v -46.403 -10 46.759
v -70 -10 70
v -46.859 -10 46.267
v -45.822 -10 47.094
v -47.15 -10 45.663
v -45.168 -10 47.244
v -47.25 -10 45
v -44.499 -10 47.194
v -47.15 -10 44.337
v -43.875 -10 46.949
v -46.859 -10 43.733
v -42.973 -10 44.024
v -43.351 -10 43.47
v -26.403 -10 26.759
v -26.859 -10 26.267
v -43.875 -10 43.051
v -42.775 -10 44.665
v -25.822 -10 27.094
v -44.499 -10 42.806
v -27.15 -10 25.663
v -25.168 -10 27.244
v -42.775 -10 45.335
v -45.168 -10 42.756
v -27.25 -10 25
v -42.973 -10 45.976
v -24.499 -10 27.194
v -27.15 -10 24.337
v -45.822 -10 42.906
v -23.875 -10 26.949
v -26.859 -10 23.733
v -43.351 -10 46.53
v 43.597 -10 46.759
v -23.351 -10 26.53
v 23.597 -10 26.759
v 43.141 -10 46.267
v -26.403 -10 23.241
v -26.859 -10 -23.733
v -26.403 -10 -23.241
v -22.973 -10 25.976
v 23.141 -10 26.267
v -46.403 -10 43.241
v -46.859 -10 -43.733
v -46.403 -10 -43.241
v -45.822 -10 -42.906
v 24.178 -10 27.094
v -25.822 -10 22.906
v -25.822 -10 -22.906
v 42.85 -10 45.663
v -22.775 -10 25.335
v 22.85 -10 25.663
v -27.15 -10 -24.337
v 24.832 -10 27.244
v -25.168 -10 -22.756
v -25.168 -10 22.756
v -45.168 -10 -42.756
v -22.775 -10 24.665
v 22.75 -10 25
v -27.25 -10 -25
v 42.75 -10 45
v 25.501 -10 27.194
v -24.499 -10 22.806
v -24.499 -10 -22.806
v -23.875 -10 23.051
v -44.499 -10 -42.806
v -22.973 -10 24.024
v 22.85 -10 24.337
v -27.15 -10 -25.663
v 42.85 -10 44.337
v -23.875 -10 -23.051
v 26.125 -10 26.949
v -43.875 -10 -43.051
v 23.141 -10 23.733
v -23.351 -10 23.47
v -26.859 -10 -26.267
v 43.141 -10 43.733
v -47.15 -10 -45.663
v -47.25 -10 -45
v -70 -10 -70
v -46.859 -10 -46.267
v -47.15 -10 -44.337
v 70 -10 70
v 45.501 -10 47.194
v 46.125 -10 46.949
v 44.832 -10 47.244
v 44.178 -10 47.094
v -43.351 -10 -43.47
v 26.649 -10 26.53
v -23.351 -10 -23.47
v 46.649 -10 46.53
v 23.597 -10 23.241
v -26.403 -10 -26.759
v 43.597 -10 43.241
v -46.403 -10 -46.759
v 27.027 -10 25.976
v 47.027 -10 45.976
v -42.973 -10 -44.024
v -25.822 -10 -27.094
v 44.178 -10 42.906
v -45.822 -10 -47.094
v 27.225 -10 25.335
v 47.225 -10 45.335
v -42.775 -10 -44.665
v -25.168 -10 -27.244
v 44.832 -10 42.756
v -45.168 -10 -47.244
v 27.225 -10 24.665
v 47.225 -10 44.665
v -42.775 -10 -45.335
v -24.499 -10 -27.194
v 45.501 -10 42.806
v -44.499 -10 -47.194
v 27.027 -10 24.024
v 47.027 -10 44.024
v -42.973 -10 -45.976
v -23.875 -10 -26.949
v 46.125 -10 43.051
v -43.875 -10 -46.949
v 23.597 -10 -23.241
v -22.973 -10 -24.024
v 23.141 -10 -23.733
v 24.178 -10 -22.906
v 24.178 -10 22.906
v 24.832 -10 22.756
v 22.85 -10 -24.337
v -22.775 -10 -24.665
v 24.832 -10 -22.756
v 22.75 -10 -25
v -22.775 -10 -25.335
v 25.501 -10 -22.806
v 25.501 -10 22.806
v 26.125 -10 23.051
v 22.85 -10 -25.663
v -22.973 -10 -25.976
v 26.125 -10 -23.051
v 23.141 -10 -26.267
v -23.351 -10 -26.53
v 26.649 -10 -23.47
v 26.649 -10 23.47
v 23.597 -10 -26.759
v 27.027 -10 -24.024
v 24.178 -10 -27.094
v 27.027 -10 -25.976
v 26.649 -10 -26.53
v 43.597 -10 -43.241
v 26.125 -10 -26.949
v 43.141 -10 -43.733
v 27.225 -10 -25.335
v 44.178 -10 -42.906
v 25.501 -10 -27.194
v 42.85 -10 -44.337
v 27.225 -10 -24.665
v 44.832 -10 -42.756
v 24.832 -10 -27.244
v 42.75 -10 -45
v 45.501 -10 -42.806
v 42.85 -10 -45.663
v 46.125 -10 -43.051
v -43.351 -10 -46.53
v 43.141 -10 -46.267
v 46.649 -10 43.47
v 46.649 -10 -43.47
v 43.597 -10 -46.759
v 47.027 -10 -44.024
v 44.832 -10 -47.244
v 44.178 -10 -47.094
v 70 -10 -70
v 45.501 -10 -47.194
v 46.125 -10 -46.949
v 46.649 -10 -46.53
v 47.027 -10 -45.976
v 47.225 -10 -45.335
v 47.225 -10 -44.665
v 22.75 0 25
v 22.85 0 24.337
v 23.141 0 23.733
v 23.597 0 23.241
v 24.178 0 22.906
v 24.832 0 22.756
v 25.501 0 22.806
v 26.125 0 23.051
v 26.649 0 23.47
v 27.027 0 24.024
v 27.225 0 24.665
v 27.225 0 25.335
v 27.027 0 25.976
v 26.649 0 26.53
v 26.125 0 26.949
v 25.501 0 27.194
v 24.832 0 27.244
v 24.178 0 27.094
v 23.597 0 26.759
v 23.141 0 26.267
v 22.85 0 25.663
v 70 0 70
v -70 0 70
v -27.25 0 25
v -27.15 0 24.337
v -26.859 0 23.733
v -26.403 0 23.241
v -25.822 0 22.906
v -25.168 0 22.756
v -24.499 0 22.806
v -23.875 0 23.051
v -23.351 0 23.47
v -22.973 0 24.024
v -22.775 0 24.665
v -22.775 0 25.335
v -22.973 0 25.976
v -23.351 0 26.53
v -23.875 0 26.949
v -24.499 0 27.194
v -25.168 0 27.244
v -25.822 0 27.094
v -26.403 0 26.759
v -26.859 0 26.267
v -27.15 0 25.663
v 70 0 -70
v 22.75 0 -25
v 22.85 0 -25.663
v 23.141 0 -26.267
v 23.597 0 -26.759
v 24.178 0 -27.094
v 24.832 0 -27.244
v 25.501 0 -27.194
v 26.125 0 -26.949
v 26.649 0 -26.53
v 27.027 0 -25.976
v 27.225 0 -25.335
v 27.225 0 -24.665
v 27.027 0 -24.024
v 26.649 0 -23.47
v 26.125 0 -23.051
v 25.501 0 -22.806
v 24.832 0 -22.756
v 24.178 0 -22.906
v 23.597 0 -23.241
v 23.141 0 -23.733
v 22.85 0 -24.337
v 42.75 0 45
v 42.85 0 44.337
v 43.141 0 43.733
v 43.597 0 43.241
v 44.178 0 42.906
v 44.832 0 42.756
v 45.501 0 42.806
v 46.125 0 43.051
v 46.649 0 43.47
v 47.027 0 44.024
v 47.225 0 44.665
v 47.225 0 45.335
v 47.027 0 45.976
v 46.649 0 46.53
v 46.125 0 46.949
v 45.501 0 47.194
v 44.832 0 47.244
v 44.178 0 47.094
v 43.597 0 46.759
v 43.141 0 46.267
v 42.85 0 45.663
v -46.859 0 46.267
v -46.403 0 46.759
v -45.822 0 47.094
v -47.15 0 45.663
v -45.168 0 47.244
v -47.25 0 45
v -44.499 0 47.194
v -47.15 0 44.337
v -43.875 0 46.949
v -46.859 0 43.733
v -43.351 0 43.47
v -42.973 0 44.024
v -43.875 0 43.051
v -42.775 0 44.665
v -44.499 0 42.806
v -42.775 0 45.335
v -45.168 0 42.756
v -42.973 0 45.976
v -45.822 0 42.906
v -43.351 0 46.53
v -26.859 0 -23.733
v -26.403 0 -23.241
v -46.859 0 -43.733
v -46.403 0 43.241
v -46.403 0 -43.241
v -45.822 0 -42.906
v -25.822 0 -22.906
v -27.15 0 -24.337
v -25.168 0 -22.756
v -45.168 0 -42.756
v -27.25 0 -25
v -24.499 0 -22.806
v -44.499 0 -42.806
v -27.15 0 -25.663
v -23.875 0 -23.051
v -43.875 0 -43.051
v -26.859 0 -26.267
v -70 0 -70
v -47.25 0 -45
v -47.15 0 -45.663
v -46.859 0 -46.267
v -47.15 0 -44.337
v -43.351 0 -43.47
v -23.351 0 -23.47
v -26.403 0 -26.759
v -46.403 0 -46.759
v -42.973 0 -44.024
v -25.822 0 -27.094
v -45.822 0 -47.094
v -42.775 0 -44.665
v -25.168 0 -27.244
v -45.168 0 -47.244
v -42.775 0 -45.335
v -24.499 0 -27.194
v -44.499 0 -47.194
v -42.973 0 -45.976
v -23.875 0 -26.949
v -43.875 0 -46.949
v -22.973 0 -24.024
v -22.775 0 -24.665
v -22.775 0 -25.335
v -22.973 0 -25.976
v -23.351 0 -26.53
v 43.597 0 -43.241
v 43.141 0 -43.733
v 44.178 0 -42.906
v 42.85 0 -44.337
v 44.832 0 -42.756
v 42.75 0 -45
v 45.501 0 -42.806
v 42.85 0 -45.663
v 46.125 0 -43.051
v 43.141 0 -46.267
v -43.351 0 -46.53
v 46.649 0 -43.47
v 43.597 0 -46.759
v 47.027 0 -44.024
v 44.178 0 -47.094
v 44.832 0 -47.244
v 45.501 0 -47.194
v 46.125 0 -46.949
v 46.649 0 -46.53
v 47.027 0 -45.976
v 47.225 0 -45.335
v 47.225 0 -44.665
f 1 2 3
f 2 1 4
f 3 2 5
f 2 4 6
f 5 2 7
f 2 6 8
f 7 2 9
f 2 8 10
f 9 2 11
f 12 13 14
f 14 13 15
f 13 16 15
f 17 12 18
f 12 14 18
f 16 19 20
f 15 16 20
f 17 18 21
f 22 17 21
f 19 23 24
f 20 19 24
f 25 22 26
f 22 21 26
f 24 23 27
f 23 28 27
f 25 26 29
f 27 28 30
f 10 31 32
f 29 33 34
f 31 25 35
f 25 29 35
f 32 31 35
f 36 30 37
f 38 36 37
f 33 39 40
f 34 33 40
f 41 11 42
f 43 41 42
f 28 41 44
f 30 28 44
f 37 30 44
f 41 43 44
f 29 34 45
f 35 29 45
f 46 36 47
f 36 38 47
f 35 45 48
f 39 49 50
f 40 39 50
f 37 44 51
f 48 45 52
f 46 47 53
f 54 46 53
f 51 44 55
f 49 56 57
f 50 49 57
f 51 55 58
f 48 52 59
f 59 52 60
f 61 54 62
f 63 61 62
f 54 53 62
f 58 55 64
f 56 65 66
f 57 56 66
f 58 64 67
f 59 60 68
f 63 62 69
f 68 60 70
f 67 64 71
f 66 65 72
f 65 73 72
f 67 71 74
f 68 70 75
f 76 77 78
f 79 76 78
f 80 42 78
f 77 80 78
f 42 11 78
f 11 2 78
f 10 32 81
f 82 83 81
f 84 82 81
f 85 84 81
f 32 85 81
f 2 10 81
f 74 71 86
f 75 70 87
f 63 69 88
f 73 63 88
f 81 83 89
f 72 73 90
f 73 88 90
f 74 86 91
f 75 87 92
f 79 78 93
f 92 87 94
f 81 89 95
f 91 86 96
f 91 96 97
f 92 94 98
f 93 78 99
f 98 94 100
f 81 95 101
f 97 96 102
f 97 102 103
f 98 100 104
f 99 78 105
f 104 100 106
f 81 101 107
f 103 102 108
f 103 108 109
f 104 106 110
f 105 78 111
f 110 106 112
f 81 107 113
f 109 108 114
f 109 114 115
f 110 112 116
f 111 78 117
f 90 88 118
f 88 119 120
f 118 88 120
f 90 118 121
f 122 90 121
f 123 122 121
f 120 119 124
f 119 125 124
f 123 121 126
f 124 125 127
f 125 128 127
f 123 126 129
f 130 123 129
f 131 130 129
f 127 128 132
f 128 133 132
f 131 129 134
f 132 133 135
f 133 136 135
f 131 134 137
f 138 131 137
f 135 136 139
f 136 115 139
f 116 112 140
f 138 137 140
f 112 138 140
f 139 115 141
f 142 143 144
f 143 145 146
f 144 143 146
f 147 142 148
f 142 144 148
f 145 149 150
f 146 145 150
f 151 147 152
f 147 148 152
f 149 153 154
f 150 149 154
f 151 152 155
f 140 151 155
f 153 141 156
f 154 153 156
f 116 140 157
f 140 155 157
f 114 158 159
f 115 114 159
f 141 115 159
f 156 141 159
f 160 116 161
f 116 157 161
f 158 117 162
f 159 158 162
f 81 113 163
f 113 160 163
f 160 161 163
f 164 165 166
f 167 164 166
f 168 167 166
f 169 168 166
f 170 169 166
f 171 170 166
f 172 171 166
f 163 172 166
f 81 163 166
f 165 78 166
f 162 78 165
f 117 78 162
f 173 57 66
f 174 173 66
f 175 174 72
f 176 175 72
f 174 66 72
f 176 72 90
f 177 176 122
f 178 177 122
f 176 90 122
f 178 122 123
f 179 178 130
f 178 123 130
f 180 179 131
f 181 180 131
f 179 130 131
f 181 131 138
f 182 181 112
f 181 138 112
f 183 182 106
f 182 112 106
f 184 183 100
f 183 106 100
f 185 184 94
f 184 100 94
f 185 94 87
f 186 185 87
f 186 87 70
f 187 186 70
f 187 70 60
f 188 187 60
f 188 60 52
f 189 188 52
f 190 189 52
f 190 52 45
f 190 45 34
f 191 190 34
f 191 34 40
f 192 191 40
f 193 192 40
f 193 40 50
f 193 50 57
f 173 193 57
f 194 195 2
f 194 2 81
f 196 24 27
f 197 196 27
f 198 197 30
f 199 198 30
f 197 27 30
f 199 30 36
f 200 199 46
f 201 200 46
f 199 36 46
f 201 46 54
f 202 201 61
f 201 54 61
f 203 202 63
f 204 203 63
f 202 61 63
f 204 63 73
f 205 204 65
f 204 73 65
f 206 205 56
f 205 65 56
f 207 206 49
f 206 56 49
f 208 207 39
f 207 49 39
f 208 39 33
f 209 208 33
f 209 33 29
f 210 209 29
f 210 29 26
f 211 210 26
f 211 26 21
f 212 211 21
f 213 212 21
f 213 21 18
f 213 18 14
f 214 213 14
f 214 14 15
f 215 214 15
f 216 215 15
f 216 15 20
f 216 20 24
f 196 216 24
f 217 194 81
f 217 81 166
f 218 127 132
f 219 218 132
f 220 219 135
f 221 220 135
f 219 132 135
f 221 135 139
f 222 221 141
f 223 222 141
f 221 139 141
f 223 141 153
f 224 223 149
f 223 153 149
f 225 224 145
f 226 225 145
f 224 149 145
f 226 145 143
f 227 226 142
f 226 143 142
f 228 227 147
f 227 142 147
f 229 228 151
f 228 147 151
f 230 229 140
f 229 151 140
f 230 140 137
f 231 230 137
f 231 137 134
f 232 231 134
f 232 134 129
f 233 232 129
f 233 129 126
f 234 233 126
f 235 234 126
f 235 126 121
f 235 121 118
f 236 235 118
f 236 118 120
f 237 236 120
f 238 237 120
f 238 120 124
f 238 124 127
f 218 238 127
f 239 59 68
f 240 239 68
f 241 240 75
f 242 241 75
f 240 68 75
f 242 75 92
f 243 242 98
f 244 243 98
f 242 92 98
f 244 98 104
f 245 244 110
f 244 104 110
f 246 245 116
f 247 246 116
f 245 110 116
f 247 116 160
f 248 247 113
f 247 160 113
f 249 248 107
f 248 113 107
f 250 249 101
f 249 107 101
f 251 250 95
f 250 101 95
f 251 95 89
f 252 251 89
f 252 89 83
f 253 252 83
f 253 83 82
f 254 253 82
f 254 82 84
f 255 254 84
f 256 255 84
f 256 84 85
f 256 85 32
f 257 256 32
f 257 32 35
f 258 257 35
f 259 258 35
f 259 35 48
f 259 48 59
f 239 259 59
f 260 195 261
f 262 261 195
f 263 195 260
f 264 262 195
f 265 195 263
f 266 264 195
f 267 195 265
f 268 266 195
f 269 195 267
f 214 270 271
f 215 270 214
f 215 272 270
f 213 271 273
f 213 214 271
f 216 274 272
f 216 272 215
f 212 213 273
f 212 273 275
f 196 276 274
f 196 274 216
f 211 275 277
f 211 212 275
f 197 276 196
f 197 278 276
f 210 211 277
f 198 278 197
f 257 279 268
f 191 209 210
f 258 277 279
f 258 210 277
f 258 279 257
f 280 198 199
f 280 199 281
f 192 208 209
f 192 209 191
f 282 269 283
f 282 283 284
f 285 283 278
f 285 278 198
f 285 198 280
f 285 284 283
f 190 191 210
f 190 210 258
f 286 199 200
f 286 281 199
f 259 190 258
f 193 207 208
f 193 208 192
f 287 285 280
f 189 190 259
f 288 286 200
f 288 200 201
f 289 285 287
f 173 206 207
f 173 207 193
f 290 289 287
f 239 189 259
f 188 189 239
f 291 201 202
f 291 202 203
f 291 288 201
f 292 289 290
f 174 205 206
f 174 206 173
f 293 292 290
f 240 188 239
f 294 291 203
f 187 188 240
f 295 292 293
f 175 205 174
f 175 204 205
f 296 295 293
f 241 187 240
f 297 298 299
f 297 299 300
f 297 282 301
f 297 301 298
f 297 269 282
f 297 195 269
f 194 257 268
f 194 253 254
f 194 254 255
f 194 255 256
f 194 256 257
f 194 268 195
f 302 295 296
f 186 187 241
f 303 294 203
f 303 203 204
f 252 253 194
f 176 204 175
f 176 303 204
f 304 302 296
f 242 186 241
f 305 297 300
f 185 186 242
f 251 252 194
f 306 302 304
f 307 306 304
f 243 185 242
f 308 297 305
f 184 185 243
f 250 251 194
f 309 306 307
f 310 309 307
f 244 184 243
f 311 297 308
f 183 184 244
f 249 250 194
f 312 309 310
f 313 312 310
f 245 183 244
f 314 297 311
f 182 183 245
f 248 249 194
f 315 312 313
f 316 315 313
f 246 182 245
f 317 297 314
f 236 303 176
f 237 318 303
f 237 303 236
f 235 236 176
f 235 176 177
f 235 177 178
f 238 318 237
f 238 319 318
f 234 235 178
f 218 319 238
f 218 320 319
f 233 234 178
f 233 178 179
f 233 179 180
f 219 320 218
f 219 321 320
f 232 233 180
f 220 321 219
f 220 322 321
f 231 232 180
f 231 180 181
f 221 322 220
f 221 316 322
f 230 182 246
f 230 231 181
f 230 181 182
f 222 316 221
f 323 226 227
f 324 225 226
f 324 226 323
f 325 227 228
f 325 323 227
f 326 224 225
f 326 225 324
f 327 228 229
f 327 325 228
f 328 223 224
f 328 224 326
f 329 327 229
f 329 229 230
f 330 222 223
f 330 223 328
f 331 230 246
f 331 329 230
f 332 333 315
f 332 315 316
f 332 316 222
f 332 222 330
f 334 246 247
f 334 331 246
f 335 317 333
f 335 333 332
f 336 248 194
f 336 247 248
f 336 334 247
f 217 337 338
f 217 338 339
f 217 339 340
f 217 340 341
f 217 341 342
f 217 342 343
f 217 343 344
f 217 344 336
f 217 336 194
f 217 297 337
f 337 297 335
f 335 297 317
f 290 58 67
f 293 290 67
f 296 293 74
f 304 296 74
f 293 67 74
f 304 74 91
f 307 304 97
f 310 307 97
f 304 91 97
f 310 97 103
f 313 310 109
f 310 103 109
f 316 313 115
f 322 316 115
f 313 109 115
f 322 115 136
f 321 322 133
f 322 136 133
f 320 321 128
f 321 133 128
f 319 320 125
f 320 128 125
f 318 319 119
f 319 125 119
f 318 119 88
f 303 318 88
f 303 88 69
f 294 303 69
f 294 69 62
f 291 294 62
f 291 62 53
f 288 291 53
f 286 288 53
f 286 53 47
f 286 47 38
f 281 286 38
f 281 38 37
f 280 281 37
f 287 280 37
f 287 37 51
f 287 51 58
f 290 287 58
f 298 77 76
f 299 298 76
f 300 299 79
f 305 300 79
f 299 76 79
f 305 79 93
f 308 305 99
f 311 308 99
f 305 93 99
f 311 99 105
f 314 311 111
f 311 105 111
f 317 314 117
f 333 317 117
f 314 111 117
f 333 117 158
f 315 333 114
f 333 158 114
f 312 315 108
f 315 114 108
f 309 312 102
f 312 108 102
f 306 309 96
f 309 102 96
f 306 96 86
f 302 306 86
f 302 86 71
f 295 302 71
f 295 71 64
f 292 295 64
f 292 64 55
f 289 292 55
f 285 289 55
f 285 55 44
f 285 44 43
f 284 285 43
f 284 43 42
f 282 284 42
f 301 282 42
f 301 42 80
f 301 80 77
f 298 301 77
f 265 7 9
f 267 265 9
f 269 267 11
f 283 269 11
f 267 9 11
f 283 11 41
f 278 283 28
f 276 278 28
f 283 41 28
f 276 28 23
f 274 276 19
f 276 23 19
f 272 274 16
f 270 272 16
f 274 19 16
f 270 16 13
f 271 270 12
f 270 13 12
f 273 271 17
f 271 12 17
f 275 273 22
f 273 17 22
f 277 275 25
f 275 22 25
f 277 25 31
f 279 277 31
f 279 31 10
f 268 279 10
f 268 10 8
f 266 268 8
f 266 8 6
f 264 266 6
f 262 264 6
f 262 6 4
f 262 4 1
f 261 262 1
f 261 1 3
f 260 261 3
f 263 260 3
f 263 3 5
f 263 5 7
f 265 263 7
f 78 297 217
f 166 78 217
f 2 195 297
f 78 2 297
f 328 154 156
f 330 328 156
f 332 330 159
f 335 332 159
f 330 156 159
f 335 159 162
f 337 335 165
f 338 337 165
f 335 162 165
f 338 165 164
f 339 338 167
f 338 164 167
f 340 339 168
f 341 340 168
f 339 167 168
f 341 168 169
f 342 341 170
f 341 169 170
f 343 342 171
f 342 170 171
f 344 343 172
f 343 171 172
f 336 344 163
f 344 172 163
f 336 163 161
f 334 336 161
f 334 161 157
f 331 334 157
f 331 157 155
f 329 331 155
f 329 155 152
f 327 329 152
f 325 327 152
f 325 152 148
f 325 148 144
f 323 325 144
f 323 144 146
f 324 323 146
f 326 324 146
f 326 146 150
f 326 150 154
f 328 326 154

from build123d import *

# Parameters (mm, degrees)
SKETCH1_W            = 140
SKETCH1_H            = 140
BOSS_EXTRUDE1_DEPTH  = 10
M4_CLEARANCE_HOLE1_D = 4.5


with BuildPart() as part:
    # Sketch1 → Boss-Extrude1 (new body)
    with BuildSketch(Plane(origin=(0, 0, 0), x_dir=(1, 0, 0), z_dir=(0, 1, 0))):
        Rectangle(SKETCH1_W, SKETCH1_H)
    extrude(amount=-BOSS_EXTRUDE1_DEPTH)

    # M4 Clearance Hole1 (through all)
    with Locations(Plane(origin=(0, 0, 0), x_dir=(1, 0, 0), z_dir=(0, 1, 0))):
        with Locations((-45, 45), (-45, -45), (45, -45), (45, 45), (25, 25), (-25, 25), (-25, -25), (25, -25)):
            Hole(M4_CLEARANCE_HOLE1_D / 2)


solid = part.part
